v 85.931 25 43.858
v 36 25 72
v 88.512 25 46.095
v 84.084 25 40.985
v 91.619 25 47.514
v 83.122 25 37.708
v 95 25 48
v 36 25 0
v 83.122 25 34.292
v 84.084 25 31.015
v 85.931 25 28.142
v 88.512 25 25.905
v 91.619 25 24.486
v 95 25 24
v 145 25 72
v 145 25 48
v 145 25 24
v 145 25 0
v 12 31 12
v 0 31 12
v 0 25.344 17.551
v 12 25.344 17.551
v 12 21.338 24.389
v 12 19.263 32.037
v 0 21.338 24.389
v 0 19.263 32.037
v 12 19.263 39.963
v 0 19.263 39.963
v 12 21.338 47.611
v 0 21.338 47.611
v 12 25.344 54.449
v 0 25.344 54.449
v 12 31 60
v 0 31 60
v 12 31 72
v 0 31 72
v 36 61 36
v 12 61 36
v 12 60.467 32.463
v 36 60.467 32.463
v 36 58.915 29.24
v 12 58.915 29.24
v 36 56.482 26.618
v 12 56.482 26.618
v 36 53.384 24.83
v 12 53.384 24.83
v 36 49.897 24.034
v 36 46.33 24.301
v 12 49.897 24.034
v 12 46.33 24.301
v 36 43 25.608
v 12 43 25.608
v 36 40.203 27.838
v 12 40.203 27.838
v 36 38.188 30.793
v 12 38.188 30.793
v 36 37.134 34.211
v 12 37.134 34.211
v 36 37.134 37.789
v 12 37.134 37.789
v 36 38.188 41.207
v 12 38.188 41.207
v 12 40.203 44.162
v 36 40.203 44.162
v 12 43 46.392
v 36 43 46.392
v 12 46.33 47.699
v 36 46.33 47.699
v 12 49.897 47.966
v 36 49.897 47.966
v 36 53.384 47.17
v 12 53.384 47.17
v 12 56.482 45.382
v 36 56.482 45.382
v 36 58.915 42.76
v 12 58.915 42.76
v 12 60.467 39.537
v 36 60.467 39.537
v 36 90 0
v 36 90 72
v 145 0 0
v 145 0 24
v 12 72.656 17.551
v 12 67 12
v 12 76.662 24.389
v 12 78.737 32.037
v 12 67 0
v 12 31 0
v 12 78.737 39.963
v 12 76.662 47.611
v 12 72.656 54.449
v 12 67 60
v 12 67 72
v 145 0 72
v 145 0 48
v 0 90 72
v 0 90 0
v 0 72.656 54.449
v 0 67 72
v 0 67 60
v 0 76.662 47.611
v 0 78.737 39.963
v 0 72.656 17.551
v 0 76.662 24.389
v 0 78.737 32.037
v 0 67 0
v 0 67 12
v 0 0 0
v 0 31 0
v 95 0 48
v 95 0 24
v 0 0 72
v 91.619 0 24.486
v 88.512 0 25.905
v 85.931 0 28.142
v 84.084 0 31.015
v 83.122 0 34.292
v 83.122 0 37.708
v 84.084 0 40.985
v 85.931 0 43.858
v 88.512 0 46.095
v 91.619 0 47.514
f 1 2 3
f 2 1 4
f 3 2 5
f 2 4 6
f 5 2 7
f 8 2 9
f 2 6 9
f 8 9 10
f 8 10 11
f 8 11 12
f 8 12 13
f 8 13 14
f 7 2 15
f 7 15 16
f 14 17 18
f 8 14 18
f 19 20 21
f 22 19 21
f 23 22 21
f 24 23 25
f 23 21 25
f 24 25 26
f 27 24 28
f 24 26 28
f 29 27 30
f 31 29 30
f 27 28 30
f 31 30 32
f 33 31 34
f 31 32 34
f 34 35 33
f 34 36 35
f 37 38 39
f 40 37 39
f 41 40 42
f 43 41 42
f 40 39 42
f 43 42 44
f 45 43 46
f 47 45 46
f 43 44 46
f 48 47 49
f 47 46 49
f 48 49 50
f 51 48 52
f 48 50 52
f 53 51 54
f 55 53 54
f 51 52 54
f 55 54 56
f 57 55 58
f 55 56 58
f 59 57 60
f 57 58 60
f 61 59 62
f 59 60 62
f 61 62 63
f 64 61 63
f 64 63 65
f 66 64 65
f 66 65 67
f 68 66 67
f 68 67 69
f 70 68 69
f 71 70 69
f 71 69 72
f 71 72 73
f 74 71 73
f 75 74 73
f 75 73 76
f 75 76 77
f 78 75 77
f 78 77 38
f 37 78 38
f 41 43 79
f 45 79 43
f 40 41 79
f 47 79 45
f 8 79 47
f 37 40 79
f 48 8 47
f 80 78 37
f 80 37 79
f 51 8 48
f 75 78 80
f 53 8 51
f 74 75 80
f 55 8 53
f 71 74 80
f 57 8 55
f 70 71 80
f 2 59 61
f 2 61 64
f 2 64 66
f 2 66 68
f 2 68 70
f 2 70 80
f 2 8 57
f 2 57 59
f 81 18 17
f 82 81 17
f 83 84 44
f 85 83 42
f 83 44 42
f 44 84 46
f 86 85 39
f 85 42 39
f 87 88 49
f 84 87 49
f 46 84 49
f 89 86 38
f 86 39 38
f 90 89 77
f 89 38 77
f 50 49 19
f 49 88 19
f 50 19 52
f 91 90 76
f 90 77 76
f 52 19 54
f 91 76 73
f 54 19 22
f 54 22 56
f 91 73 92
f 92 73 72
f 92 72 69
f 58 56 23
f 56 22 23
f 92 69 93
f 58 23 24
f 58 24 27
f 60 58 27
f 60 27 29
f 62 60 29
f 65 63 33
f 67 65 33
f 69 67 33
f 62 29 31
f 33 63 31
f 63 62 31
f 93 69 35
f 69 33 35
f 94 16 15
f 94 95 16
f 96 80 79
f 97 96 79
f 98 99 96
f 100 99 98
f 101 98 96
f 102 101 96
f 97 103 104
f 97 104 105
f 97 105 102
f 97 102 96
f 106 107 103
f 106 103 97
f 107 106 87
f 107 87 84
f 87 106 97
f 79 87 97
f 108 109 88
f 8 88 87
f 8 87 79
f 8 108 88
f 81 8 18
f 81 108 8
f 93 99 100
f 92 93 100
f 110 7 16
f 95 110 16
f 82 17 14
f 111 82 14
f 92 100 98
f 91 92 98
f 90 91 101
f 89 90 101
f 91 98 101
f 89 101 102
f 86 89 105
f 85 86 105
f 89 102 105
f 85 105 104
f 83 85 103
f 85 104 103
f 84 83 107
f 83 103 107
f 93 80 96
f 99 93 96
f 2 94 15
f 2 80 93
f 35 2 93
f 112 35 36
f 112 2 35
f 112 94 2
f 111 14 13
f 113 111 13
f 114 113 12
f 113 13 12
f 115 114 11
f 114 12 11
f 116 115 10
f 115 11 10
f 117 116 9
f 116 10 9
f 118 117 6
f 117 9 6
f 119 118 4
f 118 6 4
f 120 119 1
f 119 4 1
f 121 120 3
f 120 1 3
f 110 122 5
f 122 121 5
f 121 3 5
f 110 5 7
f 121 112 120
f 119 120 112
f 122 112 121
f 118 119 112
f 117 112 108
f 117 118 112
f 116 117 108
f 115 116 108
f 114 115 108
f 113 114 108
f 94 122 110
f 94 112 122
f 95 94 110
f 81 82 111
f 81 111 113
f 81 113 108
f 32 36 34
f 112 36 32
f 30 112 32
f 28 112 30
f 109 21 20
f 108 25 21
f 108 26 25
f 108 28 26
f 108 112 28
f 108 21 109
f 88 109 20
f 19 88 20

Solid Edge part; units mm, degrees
sketch "Sketch1" plane through (0, 0, 0) normal (0, -1, 0) x (1, 0, 0)
  line L0 (0, 72) -> (0, 0)
  line L1 (0, 0) -> (145, 0)
  line L2 (145, 0) -> (145, 72)
  line L3 (145, 72) -> (0, 72)
extrude "Protrusion1" add sketch "Sketch1" against normal blind 25
sketch "Sketch2" plane through (0, 0, 0) normal (0, -1, 0) x (1, 0, 0)
  line L0 (36, 0) -> (36, 72)
  line L1 (36, 72) -> (0, 72)
  line L2 (0, 72) -> (0, 0)
  line L3 (0, 0) -> (36, 0)
extrude "ExtrudedProtrusion_2" add sketch "Sketch2" against normal blind 90
sketch "Sketch3" plane through (90.5, 25, 36) normal (0, 1, 0) x (1, 0, 0)
  line L0 (54.5, 12) -> (4.5, 12)
  line L1 (54.5, -12) -> (54.5, 12)
  line L2 (4.5, -12) -> (54.5, -12)
  arc A0 (4.5, -12) -> (4.5, 12) centre (4.5, 0) cw
extrude "ExtrudedCutout_1" cut sketch "Sketch3" against normal blind 25 and the other way blind 1
sketch "Sketch4" plane through (0, 45, 36) normal (-1, 0, 0) x (0, 1, 0)
  circle A0 centre (4, 0) radius 12
  circle A1 centre (4, 0) radius 30
extrude "ExtrudedCutout_5" cut sketch "Sketch4" against normal blind 12 and the other way blind 1
sketch "Sketch5" plane through (0, 49, 36) normal (-1, 0, 0) x (0, 1, 0)
  circle A0 centre (0, 0) radius 12
extrude "ExtrudedCutout_6" cut sketch "Sketch5" against normal blind 36 and the other way blind 1
sketch "Sketch6" plane through (0, 45, 36) normal (-1, 0, 0) x (0, 1, 0)
  line L0 (4, 36) -> (22, 36)
  line L1 (22, 36) -> (22, 24)
  arc A0 (22, 24) -> (-14, 24) centre (4, 0) ccw
  line L2 (-14, 36) -> (-14, 24)
  line L3 (4, 36) -> (-14, 36)
  line L4 (4, -36) -> (22, -36)
  line L5 (22, -36) -> (22, -24)
  arc A1 (22, -24) -> (-14, -24) centre (4, 0) cw
  line L6 (-14, -36) -> (-14, -24)
  line L7 (4, -36) -> (-14, -36)
extrude "ExtrudedCutout_7" cut sketch "Sketch6" against normal blind 12 and the other way blind 1
